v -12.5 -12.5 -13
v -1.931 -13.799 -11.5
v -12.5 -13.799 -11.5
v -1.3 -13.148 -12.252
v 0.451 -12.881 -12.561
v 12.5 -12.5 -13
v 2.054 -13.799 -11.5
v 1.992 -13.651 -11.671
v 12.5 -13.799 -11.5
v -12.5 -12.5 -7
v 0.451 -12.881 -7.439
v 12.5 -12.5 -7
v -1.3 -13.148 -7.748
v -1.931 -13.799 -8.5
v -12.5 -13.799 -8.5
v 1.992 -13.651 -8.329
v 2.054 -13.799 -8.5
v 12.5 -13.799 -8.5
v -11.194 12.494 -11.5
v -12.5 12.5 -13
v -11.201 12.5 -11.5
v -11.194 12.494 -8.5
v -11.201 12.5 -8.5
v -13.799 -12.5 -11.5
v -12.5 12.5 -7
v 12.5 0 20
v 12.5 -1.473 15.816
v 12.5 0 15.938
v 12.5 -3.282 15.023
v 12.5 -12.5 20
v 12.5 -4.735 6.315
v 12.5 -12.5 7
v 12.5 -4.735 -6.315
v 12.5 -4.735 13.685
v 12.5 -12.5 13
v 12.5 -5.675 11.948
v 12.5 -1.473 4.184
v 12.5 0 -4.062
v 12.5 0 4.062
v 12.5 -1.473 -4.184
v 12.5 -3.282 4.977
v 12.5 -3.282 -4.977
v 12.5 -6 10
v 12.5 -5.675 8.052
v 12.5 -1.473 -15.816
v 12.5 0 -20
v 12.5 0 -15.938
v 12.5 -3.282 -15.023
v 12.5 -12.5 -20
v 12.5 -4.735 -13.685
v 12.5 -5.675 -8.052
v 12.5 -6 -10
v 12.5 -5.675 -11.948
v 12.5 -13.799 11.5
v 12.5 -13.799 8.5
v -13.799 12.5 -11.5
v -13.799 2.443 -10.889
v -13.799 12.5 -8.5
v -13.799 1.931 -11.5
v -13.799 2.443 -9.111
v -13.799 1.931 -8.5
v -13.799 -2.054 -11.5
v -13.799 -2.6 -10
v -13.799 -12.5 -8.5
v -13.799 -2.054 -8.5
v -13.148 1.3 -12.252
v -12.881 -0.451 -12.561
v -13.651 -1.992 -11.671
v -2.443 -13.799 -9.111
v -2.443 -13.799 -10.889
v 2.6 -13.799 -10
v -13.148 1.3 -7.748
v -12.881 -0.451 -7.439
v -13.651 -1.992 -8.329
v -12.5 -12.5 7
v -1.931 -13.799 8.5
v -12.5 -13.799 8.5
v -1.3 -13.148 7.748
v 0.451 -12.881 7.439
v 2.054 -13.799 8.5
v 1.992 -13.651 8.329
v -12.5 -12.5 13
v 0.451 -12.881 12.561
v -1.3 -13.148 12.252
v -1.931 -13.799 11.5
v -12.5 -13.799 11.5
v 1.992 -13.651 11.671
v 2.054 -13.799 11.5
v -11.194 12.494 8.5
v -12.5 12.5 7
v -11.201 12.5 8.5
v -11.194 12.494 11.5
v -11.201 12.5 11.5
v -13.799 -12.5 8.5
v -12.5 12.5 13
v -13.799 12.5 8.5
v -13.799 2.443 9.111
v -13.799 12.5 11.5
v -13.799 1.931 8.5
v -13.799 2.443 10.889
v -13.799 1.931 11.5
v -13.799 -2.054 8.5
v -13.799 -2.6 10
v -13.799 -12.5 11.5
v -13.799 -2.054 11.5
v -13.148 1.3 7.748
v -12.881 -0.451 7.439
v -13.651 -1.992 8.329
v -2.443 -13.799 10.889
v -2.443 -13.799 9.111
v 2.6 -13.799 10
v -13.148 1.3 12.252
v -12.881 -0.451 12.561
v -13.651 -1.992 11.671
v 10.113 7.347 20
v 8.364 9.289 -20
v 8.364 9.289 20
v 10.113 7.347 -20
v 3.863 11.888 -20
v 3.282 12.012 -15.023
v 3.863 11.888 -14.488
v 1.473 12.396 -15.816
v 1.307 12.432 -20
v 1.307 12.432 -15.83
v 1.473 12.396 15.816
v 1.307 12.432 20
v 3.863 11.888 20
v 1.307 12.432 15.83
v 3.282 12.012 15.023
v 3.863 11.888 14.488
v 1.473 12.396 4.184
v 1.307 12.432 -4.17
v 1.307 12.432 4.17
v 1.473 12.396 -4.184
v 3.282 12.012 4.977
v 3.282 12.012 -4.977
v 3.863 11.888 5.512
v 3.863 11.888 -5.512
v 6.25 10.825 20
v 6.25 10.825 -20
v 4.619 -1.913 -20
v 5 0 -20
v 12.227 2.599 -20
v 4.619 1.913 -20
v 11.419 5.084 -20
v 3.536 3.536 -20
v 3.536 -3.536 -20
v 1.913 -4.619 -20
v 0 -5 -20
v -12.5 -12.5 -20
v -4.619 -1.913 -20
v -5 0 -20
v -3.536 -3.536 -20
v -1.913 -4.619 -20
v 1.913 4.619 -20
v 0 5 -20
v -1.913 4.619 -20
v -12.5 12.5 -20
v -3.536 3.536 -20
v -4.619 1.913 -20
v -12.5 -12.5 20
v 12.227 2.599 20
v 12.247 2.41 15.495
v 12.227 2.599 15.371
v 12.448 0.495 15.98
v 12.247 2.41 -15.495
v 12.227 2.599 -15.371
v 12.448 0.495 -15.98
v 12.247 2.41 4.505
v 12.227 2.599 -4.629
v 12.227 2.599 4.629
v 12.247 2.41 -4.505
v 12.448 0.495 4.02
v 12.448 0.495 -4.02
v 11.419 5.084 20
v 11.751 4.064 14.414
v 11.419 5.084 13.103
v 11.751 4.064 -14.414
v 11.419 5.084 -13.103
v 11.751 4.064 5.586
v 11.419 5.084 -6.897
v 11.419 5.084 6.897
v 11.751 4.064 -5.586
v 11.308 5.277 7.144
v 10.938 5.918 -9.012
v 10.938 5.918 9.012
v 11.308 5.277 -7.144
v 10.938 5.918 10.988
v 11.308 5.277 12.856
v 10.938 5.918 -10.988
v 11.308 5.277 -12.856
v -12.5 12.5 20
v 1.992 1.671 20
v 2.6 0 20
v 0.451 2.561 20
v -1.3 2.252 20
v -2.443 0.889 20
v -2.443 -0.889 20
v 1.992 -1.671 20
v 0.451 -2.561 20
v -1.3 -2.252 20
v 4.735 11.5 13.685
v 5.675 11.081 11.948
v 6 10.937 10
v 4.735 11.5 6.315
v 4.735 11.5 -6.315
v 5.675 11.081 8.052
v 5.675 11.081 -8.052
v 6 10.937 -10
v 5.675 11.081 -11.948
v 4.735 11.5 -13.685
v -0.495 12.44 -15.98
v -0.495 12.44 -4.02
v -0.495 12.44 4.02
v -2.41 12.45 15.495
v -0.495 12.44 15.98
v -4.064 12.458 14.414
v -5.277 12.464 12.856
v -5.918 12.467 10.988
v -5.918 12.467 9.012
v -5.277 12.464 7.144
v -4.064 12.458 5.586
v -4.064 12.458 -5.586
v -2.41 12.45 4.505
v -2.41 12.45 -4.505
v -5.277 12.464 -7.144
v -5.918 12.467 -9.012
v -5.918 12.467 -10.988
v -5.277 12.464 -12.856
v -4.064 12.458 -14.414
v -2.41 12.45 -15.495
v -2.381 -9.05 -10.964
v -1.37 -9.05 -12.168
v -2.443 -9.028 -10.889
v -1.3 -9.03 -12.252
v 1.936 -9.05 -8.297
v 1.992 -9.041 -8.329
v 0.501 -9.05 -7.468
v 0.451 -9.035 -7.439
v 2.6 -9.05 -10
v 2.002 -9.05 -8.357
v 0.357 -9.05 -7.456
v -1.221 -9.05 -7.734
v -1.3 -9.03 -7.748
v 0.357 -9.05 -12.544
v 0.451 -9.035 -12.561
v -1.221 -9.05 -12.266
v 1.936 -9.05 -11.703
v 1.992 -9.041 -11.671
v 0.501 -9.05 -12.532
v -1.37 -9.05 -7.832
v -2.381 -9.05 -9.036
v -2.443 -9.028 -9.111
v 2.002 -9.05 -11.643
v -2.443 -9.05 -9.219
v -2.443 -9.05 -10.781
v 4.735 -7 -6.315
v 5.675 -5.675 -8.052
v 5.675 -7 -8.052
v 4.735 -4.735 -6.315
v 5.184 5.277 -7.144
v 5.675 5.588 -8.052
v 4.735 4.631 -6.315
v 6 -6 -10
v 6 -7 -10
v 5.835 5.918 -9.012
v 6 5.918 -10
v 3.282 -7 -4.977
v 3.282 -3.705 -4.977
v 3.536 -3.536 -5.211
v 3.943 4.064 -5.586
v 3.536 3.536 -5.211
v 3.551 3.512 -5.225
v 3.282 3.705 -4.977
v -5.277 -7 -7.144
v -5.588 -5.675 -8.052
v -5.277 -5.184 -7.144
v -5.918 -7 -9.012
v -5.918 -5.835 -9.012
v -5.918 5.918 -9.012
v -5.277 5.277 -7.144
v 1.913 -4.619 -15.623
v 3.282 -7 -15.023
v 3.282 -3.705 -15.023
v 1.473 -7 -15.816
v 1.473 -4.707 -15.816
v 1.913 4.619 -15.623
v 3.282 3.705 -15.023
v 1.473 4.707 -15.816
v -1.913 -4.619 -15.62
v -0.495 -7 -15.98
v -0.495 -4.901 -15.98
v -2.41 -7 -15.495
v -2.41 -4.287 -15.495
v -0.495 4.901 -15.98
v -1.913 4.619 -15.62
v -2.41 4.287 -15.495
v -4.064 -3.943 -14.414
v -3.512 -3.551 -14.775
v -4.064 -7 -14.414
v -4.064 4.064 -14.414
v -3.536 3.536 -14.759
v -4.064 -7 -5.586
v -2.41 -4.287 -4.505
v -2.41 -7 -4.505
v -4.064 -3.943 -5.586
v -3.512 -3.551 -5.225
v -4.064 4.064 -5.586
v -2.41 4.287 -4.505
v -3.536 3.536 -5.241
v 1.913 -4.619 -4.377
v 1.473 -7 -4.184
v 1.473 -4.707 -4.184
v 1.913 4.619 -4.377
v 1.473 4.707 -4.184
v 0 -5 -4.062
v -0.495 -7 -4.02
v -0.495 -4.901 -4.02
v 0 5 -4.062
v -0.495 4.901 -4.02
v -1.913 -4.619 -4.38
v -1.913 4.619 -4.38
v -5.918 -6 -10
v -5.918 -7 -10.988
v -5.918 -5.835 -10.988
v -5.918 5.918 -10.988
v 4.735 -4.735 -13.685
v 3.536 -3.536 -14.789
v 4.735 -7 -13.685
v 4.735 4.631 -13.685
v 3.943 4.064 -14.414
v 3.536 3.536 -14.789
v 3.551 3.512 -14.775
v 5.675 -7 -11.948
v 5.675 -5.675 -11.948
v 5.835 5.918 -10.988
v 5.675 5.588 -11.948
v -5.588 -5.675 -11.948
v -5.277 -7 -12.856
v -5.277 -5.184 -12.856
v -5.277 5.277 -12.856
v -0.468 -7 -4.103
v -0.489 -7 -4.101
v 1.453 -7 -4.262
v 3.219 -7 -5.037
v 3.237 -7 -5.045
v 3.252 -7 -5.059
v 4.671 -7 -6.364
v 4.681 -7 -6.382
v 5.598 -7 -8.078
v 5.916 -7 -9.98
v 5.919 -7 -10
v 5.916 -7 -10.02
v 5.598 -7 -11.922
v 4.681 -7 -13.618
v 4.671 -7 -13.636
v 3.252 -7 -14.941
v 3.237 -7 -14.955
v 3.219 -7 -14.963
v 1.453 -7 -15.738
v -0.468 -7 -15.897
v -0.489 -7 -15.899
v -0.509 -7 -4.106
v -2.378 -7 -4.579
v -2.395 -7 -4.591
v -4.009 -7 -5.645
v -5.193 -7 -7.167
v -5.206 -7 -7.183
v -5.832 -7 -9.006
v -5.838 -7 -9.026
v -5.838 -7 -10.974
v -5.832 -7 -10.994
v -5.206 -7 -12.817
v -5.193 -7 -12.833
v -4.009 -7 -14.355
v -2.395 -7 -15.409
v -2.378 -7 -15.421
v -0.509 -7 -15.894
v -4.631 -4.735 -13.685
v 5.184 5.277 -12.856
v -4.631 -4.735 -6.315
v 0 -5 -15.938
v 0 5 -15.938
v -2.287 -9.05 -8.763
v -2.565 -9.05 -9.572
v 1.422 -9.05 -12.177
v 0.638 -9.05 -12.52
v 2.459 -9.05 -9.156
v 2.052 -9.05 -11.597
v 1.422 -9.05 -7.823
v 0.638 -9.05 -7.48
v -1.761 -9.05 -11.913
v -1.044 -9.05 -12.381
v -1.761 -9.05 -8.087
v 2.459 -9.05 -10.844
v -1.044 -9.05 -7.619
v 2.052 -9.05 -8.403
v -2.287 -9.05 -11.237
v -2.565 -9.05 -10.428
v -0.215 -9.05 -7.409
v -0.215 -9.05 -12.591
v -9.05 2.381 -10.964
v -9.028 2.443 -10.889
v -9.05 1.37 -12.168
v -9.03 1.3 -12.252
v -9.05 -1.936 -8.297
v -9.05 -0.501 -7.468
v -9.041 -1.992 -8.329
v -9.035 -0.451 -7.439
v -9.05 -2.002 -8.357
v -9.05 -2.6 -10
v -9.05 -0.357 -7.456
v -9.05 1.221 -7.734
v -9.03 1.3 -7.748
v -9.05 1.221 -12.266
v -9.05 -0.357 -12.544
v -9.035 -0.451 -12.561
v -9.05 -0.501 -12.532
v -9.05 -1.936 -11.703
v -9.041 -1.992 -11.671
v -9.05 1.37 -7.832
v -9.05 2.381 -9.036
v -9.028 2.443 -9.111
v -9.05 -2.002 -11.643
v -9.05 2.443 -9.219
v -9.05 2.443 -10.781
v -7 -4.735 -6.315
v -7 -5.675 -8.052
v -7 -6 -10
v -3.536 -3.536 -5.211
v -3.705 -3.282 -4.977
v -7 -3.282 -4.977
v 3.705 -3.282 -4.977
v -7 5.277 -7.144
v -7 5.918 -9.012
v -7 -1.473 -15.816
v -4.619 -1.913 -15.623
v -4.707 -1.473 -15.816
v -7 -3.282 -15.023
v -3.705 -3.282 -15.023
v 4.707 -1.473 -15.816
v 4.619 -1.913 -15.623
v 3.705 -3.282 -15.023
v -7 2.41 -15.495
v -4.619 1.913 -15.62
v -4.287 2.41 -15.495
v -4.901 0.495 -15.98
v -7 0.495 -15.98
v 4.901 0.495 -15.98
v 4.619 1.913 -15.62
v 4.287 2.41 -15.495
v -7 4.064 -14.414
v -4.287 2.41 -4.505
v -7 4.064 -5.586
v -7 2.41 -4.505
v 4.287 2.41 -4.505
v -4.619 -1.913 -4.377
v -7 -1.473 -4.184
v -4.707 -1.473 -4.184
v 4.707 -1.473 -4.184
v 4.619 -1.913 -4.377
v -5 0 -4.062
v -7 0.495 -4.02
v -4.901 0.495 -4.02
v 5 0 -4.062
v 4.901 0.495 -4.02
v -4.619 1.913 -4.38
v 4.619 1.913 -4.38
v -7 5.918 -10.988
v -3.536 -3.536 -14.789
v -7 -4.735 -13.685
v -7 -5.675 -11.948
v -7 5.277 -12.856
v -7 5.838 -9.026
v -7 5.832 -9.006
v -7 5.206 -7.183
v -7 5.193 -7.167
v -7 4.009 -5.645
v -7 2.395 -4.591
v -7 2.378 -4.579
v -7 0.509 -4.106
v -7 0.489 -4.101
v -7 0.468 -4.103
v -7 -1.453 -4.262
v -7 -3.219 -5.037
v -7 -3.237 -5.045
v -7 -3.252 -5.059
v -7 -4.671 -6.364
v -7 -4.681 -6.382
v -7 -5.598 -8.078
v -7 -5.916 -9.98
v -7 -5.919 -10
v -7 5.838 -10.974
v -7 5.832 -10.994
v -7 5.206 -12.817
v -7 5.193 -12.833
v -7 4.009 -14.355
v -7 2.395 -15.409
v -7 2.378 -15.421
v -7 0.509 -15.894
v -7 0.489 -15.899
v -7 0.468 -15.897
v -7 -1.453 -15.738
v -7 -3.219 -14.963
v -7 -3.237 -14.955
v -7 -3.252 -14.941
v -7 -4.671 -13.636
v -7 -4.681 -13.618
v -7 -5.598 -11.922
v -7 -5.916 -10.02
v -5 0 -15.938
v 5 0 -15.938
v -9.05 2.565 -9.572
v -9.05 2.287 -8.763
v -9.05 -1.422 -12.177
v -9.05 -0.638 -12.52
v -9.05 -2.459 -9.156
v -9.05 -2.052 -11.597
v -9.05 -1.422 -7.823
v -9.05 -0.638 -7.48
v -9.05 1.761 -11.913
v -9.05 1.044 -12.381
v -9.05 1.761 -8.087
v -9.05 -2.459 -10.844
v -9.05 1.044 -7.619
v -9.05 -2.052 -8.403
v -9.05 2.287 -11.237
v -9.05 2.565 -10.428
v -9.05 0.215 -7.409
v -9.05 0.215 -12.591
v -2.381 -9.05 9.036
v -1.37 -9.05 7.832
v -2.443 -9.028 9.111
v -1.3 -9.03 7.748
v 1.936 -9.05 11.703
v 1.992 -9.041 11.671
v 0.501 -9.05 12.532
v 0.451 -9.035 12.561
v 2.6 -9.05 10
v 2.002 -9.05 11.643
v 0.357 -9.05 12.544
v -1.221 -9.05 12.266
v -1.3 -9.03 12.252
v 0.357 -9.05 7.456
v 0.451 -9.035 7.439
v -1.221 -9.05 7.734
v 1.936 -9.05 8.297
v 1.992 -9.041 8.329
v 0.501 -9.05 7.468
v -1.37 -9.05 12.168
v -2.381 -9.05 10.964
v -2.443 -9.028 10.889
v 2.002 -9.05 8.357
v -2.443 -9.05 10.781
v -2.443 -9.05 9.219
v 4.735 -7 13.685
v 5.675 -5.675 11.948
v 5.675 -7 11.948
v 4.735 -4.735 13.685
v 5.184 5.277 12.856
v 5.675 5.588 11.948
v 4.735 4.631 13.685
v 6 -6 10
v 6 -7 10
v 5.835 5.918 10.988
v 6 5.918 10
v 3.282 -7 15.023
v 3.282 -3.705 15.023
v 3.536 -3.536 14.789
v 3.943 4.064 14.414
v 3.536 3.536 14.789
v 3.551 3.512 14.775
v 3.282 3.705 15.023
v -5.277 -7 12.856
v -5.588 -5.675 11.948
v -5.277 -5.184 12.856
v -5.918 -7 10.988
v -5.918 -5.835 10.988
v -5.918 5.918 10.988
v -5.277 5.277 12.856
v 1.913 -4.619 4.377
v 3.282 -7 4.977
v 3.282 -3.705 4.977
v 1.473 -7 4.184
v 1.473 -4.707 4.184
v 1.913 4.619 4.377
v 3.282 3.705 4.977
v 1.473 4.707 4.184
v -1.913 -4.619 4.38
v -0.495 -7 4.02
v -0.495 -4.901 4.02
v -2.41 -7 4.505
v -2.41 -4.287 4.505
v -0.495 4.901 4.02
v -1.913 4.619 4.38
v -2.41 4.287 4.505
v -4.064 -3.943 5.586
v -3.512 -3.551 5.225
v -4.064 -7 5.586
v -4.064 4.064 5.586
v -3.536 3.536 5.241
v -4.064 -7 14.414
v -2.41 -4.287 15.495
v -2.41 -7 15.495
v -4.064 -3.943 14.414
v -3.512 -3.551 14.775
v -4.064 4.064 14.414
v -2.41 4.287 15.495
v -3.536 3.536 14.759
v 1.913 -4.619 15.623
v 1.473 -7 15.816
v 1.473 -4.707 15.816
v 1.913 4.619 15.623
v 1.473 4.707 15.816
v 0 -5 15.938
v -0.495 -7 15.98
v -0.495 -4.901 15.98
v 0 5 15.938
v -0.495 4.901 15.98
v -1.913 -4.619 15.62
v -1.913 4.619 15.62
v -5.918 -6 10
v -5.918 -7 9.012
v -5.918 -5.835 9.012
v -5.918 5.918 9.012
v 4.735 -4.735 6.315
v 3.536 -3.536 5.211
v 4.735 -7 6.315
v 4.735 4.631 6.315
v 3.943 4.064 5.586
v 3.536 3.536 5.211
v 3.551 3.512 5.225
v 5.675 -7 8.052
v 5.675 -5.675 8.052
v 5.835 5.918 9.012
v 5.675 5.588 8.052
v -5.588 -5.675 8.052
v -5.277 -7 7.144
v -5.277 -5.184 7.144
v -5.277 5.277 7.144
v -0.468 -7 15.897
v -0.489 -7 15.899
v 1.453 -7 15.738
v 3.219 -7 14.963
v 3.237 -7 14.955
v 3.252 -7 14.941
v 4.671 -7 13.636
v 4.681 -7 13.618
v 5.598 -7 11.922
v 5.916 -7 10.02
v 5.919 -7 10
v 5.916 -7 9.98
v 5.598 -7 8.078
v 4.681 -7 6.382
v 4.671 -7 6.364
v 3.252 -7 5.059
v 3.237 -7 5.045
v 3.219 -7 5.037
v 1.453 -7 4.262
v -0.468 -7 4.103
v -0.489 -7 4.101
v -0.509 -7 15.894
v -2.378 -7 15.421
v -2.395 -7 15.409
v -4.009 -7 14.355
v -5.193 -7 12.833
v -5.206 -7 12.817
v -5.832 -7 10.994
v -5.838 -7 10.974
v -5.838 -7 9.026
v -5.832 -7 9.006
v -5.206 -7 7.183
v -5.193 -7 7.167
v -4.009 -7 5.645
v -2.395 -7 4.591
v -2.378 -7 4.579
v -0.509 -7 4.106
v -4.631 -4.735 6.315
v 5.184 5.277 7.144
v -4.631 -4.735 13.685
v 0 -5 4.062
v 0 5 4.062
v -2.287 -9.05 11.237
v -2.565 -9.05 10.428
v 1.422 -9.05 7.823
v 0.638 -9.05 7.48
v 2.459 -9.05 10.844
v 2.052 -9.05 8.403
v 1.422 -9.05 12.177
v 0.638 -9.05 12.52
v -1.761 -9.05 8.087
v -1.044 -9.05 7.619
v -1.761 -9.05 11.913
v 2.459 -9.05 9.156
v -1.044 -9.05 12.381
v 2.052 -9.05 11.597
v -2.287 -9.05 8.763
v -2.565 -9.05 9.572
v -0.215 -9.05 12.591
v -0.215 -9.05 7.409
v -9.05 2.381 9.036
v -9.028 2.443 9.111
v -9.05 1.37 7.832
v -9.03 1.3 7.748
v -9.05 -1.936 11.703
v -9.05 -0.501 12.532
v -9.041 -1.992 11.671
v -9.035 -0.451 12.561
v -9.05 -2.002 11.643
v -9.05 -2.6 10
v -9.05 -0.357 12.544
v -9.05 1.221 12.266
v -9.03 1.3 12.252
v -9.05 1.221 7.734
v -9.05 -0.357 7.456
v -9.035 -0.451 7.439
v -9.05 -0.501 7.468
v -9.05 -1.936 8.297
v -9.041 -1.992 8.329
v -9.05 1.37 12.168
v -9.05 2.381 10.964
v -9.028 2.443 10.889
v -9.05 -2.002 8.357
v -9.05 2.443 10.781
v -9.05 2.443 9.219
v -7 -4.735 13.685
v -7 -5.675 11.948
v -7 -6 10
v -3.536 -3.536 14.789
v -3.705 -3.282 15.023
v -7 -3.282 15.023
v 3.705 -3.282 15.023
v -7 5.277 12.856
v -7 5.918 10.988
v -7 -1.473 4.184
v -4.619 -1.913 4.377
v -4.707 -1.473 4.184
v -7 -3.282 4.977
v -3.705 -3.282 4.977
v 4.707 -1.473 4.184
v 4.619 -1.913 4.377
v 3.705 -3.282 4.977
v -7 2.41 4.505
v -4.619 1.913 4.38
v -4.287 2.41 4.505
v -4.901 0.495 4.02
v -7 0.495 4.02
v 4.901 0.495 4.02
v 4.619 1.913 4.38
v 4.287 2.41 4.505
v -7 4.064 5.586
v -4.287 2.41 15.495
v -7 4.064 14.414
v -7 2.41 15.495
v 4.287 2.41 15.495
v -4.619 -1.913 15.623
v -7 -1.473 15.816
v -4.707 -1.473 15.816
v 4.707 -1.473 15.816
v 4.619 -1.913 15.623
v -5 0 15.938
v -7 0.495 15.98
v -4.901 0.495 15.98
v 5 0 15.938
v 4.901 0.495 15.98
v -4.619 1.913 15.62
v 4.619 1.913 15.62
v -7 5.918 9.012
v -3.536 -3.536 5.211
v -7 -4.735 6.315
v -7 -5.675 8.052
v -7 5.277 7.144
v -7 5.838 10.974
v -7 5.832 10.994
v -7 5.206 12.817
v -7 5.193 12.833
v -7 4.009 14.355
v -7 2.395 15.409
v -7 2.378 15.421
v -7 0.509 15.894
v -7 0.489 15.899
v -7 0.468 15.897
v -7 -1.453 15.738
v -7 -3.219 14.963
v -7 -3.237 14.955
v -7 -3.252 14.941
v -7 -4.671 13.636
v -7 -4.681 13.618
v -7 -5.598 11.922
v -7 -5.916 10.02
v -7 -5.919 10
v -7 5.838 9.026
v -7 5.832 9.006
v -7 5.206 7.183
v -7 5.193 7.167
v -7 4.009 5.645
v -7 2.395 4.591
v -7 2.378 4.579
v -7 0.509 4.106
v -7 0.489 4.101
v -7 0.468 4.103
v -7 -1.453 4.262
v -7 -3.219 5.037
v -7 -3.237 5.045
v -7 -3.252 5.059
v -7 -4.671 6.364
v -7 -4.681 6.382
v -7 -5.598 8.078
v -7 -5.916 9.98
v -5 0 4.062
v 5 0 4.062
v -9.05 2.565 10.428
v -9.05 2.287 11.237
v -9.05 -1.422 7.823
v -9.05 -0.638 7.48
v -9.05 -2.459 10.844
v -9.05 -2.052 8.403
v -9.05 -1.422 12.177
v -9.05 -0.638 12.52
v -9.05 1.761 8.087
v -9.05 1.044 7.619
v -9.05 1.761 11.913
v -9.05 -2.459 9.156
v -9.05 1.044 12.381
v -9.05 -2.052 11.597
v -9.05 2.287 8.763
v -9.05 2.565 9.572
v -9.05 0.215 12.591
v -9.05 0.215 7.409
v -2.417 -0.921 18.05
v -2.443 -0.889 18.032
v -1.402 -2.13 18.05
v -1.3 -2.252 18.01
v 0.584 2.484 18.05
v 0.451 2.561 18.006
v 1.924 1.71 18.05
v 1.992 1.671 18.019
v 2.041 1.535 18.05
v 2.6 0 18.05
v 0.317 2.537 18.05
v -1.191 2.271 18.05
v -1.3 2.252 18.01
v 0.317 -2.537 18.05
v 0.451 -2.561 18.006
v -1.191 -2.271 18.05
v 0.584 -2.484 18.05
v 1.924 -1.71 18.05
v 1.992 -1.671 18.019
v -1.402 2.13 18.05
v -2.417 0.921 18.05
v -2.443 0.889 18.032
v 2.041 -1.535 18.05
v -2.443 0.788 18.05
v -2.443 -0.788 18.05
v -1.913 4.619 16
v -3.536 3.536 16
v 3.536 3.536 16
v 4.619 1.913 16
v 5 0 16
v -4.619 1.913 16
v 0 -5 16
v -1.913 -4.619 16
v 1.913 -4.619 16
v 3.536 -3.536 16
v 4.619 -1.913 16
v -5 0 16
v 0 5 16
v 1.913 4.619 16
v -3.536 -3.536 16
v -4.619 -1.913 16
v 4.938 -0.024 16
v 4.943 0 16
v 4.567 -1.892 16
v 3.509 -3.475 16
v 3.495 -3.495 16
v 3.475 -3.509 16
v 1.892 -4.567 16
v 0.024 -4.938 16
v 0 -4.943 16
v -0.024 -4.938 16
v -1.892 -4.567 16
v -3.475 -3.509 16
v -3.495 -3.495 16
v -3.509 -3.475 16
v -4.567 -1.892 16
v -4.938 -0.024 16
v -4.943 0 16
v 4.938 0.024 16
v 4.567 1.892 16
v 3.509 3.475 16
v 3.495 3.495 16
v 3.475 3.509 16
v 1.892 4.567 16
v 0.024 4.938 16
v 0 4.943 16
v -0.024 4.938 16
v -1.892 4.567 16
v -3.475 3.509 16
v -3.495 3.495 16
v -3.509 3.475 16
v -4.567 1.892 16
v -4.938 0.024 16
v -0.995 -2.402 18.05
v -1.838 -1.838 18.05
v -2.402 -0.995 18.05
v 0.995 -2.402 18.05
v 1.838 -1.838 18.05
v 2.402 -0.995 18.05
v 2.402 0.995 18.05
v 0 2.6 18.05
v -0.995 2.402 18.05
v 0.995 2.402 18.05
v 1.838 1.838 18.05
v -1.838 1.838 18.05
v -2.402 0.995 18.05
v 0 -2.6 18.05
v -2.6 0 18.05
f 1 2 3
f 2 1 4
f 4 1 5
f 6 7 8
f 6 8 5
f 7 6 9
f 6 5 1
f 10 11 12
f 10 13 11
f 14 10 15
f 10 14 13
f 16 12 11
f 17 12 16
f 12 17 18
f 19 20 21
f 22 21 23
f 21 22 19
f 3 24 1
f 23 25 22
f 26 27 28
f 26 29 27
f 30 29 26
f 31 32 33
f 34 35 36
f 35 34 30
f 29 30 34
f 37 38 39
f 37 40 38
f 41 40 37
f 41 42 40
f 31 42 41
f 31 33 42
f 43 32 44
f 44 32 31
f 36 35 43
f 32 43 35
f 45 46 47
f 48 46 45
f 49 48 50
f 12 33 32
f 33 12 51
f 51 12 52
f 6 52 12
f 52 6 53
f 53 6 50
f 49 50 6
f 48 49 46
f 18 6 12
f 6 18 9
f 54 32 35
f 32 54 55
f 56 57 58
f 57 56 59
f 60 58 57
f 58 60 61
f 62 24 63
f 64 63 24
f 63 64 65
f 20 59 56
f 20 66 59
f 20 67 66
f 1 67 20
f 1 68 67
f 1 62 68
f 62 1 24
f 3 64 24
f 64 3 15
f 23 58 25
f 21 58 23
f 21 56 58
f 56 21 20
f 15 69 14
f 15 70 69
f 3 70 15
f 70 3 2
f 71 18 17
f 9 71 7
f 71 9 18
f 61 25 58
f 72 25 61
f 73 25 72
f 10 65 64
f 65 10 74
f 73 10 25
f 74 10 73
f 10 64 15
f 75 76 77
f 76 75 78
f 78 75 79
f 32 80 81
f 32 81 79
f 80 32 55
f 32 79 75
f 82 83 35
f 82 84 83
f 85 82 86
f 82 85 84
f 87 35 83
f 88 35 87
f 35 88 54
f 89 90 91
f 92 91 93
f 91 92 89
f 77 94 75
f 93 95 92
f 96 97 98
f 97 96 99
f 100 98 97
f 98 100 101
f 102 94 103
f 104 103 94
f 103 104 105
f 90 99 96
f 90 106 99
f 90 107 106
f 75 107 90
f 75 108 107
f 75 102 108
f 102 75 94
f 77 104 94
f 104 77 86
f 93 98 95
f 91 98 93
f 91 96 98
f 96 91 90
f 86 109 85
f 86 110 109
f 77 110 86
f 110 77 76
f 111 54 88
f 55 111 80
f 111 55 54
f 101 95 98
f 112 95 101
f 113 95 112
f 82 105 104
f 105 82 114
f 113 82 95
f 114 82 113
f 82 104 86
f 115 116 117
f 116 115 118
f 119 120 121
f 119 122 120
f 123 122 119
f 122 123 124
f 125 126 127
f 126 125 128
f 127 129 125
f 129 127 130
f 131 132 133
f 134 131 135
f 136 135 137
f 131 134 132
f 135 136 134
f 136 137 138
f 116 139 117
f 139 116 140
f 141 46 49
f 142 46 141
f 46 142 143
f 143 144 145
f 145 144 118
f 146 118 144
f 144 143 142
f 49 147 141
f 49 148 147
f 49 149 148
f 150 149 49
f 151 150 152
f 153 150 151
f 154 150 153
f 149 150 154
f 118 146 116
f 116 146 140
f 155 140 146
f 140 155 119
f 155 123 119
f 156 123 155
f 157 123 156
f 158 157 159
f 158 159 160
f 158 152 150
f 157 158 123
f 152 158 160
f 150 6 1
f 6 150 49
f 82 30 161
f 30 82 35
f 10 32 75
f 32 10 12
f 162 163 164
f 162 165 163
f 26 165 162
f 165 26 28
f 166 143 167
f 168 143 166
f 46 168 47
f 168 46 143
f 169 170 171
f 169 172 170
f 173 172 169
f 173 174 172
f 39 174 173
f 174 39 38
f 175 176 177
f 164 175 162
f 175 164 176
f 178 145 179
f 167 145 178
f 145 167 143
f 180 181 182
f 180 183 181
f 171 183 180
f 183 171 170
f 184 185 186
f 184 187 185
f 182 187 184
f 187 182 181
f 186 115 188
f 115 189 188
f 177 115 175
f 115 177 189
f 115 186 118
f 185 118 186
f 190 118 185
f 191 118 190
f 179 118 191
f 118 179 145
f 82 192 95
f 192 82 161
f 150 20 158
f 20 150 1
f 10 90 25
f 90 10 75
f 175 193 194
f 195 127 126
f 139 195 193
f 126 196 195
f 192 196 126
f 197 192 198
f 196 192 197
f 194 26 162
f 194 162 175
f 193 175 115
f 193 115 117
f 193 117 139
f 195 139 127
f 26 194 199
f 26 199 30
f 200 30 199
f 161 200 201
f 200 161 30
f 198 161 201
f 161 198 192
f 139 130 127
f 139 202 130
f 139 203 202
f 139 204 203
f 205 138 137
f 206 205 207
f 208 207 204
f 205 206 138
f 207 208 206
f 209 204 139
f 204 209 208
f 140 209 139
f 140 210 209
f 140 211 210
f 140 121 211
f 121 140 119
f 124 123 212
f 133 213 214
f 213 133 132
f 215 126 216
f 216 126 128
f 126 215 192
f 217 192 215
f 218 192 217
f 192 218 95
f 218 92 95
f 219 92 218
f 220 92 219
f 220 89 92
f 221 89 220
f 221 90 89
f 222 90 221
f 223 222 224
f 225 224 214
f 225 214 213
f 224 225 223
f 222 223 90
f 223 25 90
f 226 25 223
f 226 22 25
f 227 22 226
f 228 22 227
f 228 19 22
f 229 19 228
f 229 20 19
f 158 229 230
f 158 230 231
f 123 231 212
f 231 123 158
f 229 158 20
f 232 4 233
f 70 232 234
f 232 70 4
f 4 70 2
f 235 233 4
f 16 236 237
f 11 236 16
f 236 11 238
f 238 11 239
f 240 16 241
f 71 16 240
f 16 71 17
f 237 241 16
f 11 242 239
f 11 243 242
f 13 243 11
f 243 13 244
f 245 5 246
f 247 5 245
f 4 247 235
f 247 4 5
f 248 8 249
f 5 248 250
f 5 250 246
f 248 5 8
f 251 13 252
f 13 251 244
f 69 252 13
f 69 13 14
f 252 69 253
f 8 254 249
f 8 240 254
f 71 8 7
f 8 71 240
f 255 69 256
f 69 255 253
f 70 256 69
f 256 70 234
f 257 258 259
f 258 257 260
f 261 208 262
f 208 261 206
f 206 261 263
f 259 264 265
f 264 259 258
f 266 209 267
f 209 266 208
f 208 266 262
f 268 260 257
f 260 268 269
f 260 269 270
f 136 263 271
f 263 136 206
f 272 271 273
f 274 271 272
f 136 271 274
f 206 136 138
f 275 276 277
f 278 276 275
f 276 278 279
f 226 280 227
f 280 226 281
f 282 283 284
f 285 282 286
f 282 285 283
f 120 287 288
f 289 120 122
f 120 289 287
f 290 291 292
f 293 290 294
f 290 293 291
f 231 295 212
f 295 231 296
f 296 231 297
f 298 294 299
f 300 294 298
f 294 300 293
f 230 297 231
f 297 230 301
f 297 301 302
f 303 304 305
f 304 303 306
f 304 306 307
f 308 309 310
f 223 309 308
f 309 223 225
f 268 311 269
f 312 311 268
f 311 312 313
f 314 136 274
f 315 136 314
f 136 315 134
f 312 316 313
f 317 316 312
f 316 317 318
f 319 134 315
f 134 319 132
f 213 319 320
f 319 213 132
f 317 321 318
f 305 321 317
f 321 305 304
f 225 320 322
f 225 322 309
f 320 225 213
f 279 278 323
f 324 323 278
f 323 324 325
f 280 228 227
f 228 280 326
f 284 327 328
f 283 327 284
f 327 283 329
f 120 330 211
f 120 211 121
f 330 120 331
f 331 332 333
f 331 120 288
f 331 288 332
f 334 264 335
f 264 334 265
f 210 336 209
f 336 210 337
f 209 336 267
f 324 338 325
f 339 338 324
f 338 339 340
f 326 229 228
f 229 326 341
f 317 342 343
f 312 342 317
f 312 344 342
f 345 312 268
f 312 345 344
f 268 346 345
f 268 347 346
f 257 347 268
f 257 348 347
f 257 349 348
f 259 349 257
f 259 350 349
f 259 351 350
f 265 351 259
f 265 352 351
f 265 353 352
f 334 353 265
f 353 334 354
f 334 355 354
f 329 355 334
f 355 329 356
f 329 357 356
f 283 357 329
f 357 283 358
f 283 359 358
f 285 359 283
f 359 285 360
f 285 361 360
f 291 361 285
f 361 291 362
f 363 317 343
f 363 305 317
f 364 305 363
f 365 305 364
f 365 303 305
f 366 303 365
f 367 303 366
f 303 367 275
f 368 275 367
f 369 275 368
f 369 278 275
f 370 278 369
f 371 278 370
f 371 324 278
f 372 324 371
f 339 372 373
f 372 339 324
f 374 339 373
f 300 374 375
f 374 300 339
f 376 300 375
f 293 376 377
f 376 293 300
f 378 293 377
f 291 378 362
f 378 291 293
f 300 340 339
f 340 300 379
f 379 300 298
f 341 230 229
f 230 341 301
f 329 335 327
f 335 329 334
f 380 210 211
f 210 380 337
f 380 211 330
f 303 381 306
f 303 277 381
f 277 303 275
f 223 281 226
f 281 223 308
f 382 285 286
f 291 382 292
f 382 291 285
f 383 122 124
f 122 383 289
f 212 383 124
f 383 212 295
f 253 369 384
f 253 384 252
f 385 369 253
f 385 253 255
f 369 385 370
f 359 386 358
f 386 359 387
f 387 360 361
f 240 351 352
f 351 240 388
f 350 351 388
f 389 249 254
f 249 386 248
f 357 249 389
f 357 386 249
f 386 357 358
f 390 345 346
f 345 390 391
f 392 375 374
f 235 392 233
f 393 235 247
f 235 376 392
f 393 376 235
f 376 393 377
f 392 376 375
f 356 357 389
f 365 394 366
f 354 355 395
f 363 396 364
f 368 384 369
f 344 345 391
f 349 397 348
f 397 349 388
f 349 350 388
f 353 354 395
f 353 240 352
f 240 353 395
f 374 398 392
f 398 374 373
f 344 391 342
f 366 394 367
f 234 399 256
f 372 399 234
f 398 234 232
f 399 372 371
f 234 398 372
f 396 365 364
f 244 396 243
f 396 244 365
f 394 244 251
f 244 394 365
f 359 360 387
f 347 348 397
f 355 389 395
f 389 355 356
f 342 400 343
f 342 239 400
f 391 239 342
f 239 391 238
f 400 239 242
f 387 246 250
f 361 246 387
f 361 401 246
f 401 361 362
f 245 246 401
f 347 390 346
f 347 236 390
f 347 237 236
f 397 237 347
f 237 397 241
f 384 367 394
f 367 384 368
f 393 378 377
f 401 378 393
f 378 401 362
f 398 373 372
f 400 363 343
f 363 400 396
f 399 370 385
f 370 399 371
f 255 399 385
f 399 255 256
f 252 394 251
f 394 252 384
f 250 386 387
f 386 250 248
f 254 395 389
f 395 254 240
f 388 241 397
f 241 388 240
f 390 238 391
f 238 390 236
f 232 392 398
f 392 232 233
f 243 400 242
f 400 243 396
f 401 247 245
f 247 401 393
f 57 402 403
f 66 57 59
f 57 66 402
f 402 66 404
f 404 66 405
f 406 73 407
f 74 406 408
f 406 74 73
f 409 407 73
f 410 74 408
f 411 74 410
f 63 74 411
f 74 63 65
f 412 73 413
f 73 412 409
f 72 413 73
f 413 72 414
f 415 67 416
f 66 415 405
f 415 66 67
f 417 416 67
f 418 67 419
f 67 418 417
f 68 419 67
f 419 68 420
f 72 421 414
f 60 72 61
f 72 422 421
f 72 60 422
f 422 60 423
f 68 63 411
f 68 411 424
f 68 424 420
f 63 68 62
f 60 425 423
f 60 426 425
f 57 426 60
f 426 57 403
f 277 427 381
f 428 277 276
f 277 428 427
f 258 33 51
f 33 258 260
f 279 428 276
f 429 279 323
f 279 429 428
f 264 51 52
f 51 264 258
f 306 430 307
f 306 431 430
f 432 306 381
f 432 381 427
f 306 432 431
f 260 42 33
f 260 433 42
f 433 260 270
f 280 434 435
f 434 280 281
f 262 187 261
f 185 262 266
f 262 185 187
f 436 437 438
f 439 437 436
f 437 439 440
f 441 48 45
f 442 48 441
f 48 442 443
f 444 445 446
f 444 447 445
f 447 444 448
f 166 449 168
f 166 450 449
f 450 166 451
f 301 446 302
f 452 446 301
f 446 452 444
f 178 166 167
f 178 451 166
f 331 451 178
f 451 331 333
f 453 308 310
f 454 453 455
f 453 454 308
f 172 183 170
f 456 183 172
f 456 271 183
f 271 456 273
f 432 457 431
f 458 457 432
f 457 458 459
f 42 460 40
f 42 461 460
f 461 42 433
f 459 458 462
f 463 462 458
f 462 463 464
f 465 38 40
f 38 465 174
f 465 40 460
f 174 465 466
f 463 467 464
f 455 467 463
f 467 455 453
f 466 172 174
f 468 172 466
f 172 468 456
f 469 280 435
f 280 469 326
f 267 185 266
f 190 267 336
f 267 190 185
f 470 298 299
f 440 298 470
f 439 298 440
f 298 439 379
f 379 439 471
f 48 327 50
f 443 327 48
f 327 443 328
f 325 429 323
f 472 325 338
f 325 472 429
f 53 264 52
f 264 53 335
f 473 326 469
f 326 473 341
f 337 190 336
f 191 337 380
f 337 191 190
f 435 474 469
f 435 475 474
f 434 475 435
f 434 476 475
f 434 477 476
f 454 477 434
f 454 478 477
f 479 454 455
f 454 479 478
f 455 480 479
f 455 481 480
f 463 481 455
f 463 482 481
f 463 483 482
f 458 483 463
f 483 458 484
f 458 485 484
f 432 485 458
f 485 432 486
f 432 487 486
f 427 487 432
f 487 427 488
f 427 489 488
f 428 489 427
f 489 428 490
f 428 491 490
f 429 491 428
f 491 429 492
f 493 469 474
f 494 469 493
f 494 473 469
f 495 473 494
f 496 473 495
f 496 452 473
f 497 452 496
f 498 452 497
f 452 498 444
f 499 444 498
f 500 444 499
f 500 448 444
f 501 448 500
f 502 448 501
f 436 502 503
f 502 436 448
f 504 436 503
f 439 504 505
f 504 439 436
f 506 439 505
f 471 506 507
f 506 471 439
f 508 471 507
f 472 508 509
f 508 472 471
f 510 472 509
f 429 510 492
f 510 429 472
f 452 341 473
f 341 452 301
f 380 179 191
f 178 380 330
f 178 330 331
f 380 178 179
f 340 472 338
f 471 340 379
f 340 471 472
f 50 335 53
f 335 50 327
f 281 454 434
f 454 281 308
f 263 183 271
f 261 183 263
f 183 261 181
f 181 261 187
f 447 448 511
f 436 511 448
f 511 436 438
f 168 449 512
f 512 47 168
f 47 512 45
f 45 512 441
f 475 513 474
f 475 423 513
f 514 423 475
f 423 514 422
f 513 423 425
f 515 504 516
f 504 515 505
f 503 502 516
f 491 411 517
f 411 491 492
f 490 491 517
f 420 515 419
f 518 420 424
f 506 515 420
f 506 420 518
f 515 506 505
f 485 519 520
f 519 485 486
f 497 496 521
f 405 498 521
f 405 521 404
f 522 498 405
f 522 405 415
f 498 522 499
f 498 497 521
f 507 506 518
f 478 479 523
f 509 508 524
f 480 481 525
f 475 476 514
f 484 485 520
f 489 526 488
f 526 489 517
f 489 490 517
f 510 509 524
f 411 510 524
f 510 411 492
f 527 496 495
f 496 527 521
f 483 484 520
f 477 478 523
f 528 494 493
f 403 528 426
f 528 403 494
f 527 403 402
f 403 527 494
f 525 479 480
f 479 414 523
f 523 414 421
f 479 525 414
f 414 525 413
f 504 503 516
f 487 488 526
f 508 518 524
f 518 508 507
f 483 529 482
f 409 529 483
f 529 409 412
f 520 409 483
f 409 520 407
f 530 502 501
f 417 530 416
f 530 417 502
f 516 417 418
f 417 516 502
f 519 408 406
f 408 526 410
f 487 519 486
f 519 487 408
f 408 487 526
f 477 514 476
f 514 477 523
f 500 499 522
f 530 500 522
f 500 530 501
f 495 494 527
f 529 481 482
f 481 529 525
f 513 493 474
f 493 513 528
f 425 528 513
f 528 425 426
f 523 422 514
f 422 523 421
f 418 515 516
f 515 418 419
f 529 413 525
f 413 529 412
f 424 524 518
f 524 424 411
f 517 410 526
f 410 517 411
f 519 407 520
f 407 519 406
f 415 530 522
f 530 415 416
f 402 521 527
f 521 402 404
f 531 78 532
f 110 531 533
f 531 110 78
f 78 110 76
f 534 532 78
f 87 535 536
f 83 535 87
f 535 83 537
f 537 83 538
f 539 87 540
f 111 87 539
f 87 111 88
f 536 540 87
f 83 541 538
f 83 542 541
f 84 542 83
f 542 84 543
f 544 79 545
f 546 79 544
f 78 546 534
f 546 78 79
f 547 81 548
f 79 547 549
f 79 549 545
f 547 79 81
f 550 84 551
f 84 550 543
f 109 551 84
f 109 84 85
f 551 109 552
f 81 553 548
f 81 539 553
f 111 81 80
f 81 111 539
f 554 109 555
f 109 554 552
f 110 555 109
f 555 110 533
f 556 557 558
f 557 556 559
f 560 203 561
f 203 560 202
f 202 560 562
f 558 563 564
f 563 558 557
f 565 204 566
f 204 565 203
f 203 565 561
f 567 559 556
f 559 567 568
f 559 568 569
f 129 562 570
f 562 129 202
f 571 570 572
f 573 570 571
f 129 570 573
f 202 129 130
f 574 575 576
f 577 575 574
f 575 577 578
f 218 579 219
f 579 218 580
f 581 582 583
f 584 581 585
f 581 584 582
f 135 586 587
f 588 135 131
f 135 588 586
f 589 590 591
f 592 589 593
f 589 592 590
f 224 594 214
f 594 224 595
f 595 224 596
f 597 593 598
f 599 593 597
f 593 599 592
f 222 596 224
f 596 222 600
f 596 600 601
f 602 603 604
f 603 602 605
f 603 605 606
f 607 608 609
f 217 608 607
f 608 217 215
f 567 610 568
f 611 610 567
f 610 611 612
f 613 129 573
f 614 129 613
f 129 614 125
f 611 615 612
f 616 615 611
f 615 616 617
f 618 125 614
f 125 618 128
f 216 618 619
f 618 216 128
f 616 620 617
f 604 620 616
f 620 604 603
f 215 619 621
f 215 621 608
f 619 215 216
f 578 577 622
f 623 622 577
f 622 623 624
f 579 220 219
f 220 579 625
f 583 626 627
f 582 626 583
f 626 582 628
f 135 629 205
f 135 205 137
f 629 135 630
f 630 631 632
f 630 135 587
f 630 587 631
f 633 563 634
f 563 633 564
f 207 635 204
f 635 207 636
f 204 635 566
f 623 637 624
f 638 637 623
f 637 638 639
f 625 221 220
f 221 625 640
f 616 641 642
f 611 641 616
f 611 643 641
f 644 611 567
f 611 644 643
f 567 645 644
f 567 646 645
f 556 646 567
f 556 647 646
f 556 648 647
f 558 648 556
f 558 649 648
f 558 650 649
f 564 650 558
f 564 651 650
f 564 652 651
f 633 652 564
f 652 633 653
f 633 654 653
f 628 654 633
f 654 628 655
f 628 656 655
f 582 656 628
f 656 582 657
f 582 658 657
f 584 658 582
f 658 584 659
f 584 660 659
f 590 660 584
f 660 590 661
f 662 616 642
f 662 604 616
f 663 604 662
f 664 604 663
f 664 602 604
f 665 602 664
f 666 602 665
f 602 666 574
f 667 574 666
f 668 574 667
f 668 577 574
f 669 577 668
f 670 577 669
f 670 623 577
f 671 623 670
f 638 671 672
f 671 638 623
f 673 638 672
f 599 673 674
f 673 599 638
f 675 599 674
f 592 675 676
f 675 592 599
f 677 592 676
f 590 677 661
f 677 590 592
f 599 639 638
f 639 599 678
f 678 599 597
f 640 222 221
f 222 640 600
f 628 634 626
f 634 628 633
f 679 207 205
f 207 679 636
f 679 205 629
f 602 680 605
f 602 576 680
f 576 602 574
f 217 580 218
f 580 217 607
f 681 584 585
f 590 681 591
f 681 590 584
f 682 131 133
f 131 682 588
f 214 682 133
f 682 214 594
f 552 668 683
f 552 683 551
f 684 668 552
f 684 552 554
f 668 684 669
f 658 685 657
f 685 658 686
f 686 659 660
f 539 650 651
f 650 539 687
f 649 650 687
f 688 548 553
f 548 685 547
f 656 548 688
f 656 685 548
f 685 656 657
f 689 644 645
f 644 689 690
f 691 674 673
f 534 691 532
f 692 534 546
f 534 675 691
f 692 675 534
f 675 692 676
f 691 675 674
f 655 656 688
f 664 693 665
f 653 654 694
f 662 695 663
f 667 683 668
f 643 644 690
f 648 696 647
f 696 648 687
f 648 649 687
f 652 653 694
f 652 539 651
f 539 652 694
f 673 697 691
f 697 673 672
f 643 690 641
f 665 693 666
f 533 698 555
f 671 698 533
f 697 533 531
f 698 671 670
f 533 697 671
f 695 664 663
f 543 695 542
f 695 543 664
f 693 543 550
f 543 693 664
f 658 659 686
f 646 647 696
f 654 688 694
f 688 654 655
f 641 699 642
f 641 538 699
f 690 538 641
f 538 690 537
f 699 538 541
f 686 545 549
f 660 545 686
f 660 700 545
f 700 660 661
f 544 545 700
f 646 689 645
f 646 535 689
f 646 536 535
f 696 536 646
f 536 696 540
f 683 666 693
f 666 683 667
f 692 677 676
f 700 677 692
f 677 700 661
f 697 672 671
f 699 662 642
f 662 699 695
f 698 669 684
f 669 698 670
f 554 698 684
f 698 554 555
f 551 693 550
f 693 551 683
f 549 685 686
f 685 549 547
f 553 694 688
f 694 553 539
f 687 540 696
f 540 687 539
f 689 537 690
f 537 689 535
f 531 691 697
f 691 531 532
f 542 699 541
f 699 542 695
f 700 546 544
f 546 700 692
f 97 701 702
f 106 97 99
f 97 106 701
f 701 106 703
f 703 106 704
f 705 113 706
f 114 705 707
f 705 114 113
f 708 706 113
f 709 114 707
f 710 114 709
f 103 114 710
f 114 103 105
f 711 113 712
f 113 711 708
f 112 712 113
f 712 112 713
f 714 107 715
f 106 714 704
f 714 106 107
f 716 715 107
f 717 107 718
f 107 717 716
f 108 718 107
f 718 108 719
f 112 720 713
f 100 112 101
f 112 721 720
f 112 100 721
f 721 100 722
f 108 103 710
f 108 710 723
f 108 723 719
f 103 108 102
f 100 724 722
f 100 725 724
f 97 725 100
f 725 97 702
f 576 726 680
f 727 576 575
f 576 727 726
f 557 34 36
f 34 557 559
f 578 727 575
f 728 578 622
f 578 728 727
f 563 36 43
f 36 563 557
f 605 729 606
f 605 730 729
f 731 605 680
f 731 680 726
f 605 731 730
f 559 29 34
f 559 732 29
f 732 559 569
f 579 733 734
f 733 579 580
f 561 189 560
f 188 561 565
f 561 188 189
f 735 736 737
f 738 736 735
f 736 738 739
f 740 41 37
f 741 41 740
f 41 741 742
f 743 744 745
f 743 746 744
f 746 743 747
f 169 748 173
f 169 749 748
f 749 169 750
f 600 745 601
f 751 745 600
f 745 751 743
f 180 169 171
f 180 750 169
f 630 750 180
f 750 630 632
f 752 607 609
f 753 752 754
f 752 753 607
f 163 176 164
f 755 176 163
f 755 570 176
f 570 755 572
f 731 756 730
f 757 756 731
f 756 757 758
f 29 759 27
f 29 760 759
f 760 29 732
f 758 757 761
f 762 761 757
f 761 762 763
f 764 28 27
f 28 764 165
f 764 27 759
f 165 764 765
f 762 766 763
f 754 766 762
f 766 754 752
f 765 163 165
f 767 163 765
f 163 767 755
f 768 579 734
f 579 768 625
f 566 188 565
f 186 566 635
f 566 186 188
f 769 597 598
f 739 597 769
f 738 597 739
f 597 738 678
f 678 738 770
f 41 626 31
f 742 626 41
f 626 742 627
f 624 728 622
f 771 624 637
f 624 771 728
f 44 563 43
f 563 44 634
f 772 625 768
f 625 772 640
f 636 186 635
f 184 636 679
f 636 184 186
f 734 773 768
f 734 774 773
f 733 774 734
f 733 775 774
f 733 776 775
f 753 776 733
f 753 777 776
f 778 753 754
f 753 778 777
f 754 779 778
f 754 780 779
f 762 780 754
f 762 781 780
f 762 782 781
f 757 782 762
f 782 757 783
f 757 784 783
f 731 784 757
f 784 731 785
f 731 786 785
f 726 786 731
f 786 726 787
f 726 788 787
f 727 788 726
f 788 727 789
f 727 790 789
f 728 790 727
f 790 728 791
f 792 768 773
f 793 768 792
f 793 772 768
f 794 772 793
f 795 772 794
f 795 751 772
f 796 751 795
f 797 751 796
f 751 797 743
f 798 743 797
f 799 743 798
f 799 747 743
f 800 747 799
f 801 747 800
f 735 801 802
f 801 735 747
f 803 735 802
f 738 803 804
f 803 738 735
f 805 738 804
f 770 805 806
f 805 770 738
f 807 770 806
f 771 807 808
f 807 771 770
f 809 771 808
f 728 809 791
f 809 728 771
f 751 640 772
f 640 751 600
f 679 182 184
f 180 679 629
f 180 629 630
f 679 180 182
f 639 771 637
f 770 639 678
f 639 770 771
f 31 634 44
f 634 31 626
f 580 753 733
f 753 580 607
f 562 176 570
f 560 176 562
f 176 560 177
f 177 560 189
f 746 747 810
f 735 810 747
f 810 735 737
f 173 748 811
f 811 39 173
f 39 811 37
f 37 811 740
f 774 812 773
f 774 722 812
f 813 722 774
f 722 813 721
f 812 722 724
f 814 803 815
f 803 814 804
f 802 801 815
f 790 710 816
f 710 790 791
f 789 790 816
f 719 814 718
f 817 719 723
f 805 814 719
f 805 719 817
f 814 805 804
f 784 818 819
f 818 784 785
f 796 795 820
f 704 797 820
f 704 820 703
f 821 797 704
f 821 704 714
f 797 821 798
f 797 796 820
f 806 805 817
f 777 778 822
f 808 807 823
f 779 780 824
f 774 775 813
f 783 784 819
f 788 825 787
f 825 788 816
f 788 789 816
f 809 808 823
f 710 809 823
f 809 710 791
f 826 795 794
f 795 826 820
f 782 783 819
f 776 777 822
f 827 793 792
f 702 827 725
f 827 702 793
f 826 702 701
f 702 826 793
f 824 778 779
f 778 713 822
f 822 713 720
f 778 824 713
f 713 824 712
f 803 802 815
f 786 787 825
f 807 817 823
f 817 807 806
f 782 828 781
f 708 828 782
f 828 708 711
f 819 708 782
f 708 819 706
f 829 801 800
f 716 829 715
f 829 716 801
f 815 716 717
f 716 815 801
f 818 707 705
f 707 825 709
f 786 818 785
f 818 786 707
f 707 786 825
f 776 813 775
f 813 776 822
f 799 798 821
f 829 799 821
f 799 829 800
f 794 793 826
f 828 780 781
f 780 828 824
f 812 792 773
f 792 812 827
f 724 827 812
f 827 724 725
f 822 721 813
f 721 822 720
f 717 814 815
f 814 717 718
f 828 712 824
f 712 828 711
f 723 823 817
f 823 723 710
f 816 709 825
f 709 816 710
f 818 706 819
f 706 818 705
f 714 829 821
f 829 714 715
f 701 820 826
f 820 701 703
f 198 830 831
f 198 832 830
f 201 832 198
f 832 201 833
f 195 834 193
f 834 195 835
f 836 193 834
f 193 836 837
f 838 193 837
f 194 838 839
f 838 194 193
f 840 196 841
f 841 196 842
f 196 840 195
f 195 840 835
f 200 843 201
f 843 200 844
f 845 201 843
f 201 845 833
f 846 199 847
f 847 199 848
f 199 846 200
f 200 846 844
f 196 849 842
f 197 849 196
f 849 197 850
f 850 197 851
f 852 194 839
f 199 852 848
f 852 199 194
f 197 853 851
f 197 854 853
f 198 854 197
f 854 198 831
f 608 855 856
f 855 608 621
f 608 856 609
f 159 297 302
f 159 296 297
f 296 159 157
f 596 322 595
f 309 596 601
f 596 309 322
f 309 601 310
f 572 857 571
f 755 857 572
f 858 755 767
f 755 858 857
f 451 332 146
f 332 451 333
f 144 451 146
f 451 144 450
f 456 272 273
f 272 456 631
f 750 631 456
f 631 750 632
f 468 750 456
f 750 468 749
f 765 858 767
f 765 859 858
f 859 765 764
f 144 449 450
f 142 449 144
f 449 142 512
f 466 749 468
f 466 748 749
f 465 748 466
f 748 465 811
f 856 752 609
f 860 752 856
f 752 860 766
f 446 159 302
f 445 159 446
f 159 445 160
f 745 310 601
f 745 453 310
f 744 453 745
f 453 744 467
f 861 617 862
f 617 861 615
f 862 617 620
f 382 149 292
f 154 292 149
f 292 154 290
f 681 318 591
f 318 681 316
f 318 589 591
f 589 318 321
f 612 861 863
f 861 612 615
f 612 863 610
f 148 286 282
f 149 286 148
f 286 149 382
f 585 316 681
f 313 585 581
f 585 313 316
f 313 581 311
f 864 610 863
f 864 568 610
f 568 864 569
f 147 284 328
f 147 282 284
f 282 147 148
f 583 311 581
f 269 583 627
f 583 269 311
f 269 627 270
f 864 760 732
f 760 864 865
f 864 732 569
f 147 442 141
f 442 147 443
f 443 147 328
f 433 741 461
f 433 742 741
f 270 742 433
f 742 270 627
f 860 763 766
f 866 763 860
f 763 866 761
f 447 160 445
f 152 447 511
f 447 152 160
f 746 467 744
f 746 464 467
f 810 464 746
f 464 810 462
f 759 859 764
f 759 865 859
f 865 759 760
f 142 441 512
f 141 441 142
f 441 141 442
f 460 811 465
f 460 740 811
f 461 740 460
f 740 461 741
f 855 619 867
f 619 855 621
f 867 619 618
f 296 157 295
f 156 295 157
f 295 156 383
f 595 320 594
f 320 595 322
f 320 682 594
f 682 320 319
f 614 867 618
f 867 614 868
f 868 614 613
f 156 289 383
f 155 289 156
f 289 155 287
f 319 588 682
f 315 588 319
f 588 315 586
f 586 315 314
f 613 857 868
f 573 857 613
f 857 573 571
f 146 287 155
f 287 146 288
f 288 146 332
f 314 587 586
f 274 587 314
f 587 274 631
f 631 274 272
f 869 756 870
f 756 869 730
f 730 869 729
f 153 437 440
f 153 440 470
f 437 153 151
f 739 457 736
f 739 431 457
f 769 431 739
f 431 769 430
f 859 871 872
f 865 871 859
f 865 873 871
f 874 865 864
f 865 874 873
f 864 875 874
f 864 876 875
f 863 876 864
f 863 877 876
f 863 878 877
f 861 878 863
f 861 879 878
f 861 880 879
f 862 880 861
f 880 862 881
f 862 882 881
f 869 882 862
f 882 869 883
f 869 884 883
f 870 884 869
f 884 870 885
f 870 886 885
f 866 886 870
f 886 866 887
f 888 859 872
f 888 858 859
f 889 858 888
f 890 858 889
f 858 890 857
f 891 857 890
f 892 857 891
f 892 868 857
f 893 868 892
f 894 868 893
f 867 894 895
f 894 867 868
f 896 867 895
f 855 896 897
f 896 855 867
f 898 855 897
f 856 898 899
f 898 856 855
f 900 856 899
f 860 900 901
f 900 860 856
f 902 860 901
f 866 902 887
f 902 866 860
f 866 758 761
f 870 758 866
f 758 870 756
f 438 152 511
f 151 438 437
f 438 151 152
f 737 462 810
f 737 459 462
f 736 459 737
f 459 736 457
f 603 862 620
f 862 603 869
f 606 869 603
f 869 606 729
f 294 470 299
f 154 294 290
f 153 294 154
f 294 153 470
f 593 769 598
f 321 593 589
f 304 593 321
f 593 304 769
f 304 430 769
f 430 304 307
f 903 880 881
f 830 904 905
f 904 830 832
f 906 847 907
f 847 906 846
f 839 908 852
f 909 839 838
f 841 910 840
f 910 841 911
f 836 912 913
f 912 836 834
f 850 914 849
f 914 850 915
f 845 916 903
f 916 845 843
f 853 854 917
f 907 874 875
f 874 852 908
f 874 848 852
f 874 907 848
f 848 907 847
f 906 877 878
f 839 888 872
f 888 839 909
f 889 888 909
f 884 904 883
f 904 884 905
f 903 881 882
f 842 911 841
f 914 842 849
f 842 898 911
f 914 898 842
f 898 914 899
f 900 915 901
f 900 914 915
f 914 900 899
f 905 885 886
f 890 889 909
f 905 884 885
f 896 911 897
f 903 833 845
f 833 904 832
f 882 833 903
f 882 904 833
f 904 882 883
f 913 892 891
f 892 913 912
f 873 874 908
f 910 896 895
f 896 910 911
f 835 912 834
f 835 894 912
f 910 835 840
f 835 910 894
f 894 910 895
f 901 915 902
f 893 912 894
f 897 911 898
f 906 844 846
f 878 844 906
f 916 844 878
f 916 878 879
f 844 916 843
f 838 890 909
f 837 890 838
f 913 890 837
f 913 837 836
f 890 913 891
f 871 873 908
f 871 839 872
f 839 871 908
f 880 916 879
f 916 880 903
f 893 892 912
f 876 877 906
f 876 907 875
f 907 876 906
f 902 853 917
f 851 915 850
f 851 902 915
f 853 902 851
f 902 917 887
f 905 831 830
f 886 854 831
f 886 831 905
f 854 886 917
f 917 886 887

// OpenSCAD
module cornerpiece()
{
  module triangle(b=10, h=10, w=4)
  {
    translate([-h/2, -b/2, 0])
      linear_extrude(height = w, center = true, convexity = 10, twist = 0)
        polygon(points=[[0,0],[h,0],[0,b]], paths=[[0,1,2]]);
  }

  difference()
  {
    union()
    {
      hull()
      {
        triangle(25, 25, 40);
        cylinder(r=25/2, h=40, center=true);
      }

      for (i=[-10, 10])
      hull() for (j=[0,-90])
        rotate(v=[0,0,10], a=j)
          translate([0,-25/2,i]) scale([1,0.5,1]) rotate([0,90,0]) cylinder(r=6/2, h=25, $fn=6, center=true);      
    }
    for (i=[-10, 10])
      for (j=[0,-90])
        translate([0,0,i])
          rotate([90,0,j])
          {
            cylinder(r=5.2/2, h=40, center=true);
            translate([0,0,-4]) cylinder(r=12/2, h=22, center=true);
            translate([0,0,8]) cylinder(r1=12/2, r2=5.2/2, h=2.1, center=true);
          }
    cylinder(r=5.2/2, h=50, center=true);
    translate([0,0,-9]) cylinder(r=10/2, h=50, center=true);
    translate([0,0,17]) cylinder(r1=10/2, r2=5.2/2, h=2.1, center=true);
  }
}

cornerpiece();
